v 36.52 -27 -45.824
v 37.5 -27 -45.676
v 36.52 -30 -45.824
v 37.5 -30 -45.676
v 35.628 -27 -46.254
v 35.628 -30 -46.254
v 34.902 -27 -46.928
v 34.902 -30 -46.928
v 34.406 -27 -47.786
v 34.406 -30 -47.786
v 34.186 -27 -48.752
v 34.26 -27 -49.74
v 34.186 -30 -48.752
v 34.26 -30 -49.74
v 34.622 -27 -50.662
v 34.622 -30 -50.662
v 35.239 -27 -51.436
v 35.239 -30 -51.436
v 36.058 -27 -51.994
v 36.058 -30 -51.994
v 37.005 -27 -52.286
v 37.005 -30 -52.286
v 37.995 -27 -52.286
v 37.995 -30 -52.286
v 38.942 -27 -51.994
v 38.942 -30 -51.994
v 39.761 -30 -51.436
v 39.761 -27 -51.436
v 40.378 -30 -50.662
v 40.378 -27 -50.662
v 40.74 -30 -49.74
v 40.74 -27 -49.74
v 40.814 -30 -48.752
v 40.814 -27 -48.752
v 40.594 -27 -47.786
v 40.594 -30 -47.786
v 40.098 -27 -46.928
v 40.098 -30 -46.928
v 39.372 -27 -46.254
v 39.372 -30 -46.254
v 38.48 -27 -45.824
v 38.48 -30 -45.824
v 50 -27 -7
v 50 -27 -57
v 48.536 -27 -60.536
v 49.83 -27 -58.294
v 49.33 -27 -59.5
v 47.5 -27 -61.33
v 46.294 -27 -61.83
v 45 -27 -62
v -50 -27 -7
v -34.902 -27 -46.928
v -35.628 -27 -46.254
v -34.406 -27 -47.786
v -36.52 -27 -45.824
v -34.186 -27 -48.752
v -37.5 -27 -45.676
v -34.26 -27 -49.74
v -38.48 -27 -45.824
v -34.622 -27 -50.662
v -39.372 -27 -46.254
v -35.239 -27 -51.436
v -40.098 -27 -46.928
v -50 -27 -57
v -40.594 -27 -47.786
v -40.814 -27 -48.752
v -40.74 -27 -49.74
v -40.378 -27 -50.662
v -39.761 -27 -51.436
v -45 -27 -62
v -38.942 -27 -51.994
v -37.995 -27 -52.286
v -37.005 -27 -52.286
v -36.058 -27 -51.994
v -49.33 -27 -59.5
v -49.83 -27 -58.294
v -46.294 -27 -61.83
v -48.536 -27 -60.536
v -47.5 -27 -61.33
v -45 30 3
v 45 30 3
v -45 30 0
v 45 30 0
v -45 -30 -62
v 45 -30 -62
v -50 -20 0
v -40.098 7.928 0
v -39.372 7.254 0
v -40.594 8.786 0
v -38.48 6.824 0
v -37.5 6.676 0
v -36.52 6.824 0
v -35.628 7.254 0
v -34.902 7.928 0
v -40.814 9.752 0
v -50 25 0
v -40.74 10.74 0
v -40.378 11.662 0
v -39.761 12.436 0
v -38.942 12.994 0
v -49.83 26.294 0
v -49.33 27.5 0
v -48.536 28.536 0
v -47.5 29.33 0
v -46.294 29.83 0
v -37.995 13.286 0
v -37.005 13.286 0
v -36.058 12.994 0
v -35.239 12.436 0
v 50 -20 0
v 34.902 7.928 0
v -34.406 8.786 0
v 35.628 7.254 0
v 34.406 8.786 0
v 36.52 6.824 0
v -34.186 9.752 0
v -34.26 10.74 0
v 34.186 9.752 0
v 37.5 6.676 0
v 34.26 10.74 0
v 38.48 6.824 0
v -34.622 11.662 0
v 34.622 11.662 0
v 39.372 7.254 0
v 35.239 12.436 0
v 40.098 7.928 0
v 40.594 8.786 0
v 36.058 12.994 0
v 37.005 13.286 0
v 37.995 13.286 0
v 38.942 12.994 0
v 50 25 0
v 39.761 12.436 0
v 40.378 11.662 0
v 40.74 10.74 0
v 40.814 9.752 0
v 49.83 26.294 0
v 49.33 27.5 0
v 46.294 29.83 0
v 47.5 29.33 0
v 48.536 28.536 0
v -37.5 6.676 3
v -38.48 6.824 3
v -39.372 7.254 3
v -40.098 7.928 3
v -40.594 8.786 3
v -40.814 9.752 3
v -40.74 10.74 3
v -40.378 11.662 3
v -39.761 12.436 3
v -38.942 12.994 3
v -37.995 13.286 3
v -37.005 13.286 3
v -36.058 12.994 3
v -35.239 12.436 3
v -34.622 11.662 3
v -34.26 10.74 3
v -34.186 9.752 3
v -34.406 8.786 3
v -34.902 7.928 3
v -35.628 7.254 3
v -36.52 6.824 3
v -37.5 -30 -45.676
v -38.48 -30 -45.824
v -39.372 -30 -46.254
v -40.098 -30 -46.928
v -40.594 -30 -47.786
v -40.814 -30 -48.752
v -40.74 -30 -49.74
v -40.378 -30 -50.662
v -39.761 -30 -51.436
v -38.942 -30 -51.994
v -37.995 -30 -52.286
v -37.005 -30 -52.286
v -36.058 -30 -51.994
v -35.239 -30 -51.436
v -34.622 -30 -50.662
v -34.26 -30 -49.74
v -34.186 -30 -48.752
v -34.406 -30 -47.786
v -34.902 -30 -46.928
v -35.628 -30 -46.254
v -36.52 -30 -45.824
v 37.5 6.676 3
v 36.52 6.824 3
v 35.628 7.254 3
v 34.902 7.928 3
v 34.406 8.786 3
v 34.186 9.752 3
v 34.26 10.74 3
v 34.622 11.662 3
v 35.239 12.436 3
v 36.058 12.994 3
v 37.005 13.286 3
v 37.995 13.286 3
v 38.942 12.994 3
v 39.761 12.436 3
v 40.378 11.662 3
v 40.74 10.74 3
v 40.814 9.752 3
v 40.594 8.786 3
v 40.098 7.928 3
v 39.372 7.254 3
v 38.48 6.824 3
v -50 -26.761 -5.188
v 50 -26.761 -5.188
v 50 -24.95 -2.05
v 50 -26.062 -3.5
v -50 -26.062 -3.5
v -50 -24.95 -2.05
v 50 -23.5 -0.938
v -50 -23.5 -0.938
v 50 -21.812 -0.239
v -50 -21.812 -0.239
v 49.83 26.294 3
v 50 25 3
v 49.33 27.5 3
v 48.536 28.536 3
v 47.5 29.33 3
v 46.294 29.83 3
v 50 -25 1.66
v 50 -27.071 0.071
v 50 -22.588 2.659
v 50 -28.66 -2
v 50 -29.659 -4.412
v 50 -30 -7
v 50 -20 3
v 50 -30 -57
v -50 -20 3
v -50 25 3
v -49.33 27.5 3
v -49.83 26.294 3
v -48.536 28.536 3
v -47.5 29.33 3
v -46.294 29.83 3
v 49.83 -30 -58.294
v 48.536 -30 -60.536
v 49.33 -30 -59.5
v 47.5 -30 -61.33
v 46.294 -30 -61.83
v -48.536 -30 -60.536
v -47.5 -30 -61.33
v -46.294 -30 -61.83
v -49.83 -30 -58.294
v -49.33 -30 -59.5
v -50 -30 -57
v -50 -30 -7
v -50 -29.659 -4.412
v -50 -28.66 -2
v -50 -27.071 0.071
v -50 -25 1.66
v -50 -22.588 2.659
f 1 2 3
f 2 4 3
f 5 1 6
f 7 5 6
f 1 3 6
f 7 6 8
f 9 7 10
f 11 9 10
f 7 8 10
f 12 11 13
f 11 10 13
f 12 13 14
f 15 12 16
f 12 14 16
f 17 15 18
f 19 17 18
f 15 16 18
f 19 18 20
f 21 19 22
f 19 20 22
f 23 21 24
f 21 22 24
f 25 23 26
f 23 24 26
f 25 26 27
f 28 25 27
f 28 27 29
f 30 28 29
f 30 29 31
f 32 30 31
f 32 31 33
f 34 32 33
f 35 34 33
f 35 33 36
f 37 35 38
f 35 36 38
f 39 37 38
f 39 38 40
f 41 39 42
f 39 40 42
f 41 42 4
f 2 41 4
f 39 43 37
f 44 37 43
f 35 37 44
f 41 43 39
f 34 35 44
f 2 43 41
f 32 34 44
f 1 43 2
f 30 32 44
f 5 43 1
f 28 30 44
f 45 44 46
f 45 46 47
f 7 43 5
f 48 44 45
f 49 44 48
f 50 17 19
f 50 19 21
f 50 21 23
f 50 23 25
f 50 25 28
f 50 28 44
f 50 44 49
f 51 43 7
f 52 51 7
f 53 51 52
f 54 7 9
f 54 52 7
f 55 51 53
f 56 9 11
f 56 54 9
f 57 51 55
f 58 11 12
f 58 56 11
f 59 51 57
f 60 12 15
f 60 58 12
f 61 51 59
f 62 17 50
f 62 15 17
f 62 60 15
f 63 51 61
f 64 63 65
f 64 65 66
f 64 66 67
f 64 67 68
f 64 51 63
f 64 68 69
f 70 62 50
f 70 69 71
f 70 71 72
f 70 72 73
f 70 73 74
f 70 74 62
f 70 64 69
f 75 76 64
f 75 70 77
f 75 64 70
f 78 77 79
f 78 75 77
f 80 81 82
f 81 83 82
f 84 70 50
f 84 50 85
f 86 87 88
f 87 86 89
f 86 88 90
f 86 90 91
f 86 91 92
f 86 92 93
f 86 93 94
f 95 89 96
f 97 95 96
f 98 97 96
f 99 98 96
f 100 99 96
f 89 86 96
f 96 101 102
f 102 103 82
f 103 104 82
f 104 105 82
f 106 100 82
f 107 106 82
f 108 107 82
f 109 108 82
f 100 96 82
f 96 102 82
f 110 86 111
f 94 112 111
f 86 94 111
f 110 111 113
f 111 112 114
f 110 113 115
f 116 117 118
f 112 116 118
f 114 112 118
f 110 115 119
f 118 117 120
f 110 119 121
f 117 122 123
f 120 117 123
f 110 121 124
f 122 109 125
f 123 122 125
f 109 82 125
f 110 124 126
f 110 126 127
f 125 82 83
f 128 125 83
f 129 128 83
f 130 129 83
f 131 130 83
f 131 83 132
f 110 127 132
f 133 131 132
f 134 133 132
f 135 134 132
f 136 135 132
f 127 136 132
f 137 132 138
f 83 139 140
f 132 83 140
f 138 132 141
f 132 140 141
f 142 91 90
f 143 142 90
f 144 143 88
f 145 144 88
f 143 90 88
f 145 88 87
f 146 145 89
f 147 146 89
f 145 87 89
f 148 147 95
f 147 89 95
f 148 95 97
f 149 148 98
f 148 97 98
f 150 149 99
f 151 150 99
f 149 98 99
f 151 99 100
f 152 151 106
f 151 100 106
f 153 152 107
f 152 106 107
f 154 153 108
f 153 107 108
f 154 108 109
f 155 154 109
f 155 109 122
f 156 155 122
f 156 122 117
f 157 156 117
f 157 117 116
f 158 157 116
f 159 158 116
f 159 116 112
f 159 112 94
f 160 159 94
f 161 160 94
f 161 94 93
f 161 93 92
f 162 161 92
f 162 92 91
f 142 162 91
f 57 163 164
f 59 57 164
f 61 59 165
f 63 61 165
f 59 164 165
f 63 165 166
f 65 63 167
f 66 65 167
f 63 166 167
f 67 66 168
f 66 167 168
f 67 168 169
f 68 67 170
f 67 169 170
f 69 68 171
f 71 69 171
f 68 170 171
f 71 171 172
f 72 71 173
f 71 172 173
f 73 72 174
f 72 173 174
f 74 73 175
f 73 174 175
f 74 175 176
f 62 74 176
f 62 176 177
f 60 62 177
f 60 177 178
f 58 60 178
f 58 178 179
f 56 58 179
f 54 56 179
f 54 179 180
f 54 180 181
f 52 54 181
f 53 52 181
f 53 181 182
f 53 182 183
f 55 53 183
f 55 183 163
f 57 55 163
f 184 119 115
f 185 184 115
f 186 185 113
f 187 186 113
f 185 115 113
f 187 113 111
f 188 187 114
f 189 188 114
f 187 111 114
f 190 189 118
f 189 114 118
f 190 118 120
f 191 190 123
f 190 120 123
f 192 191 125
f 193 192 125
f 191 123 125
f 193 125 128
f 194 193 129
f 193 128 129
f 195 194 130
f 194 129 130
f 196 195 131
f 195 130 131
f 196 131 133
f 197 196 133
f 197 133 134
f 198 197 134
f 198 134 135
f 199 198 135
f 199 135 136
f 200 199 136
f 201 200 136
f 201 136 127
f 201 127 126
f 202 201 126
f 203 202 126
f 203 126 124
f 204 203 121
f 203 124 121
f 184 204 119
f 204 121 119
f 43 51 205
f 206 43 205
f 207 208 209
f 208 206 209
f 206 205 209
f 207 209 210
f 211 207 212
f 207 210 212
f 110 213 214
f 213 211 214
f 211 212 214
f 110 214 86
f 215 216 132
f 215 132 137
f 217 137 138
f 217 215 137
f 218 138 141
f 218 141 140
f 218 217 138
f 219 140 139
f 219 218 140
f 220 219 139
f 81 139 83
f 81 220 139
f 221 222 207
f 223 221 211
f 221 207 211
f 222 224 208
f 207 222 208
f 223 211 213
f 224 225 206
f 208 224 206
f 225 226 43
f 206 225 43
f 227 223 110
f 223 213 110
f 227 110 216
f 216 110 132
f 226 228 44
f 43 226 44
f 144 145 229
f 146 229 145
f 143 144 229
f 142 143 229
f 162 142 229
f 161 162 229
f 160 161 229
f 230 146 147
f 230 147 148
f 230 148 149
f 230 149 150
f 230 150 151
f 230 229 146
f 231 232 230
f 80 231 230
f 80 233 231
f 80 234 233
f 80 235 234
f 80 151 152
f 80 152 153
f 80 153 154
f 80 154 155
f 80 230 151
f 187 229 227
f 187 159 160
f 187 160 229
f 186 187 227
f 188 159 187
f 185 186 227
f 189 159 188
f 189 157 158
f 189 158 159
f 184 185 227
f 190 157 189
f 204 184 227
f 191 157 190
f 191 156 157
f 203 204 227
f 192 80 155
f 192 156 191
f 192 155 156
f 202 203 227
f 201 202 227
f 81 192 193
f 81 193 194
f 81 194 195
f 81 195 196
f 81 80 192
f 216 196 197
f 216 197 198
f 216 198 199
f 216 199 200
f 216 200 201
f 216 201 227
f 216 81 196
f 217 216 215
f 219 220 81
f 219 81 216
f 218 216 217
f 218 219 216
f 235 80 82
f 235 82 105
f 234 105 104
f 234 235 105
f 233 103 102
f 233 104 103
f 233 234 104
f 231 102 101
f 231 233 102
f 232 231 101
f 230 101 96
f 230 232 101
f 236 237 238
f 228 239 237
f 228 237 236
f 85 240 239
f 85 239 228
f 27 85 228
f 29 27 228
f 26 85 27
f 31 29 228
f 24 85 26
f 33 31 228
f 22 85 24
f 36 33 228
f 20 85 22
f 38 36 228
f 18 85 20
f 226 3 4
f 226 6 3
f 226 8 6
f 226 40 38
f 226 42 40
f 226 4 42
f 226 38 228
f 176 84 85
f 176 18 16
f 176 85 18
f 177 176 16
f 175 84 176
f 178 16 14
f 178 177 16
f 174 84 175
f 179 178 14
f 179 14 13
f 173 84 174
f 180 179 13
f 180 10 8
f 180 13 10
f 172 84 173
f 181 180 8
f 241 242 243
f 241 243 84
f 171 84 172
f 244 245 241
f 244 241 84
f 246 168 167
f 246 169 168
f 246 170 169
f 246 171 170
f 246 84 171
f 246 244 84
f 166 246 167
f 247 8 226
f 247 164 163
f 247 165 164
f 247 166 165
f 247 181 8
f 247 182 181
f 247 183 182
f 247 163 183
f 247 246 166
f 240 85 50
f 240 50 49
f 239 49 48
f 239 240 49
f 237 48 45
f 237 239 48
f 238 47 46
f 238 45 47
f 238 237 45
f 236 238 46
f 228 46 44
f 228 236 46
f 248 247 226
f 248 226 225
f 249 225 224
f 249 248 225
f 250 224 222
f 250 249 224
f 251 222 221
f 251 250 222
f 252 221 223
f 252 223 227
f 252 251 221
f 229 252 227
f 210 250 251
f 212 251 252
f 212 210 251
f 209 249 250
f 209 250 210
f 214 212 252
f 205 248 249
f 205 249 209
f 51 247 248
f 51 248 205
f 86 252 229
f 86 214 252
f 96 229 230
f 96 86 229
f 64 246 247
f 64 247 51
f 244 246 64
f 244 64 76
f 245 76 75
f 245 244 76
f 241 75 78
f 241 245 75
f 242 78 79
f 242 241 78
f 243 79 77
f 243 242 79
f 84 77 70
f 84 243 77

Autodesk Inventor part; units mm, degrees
ref_plane "YZ Plane" through (0, 0, 0) normal (1, 0, 0) x (0, 1, 0)
ref_plane "XZ Plane" through (0, 0, 0) normal (0, 1, 0) x (-1, 0, 0)
ref_plane "XY Plane" through (0, 0, 0) normal (0, 0, 1) x (1, 0, 0)
sketch "Sketch1" plane through (0, 0, 0) normal (0, 0, 1) x (1, 0, 0)
  line L0 (-50, -30) -> (50, -30)
  line L1 (50, -30) -> (50, 30)
  line L2 (50, 30) -> (-50, 30)
  line L3 (-50, 30) -> (-50, -30)
  line L4 (-50, -30) -> (50, 30) construction
  line L5 (50, -30) -> (-50, 30) construction
  point P0 (0, 0)
  dimension "d0" = 60
  dimension "d1" = 100
extrude "Extrusion1" add sketch "Sketch1" along normal blind 3
sketch "Sketch2" plane through (-50, -27, 3) normal (0, -1, 0) x (1, 0, 0)
  line L0 (100, 0) -> (0, 0)
  line L1 (0, 0) -> (0, -65)
  line L2 (0, -65) -> (100, -65)
  line L3 (100, -65) -> (100, 0)
edge flange "Flange1" height 65 angle 90 thickness 3 bend radius 7 thickness toward (0, -1, 0) relief tear relief width 3 relief depth 1.5 edges at (0, -30, 0) wall of the first edge with corners at (50, -27, 3) (-50, -27, 3) (-50, -27, -62) (50, -27, -62)
bend "Bend1"
corner "Corner1"
sketch "Sketch3" plane through (0, 0, 3) normal (0, 0, 1) x (1, 0, 0)
  line L0 (50, 30) -> (-50, 30) projected
  point P0 (0, 0)
  point P1 (-37.5, 10)
  point P2 (37.5, 10)
  dimension "d15" = 20
  dimension "d16" = 37.5
  dimension "d17" = 75
hole "Hole1" at (-37.5, 10, 3) at (37.5, 10, 3) direction (0, 0, -1) diameter 6.647 end through all thread size "M8x1.25" class "6H" standard "ANSI Metric M Profile"
sketch "Sketch4" plane through (-50, -27, -62) normal (0, 1, 0) x (1, 0, 0)
  line L0 (0, -65) -> (100, -65) projected
  line L1 (50, -65) -> (50, 0) construction
  line L2 (100, 0) -> (0, 0) projected
  point P0 (50, -62)
  point P1 (87.5, -13)
  point P2 (12.5, -13)
  dimension "d26" = 37.5
  dimension "d27" = 75
  dimension "d36" = 52
hole "Hole2" at (37.5, -27, -49) at (-37.5, -27, -49) direction (0, -1, 0) diameter 6.647 end through all thread size "M8x1.25" class "6H" standard "ANSI Metric M Profile"
fillet "Fillet1" radius 5 4 edges at (-50, 30, 1.5) (50, 30, 1.5) (-50, -28.5, -62) (50, -28.5, -62)
equation "\"d1\" = Width"
equation "\"d4\" = Thickness"
equation "\"d5\" = BendReliefWidth"
equation "\"d6\" = BendReliefDepth"
equation "\"d7\" = MinimumRemnant"
equation "\"d8\" = TransitionRadius"
equation "\"d12\" = CornerReliefSize"
equation "\"d13\" = GapSize"
equation "\"d14\" = JacobiRadiusSize"
equation "\"d16\" = 0.5 * Bolt_Width"
equation "\"d17\" = Bolt_Width"
equation "\"d26\" = 0.5 * Bolt_Width"
equation "\"d27\" = Bolt_Width"
equation "\"BendRadius\" = Thickness"
equation "\"BendReliefWidth\" = Thickness"
equation "\"BendReliefDepth\" = 0.5 * Thickness"
equation "\"CornerReliefSize\" = 4 * Thickness"
equation "\"MinimumRemnant\" = 2 * Thickness"
equation "\"TransitionRadius\" = BendRadius"
equation "\"JacobiRadiusSize\" = BendRadius"
equation "\"GapSize\" = Thickness"
equation "\"Width\" = 100"
equation "\"Thickness\" = 3"
equation "\"Bolt_Width\" = 75"
properties part number "Clamp_Plate" material "Steel, Carbon"
